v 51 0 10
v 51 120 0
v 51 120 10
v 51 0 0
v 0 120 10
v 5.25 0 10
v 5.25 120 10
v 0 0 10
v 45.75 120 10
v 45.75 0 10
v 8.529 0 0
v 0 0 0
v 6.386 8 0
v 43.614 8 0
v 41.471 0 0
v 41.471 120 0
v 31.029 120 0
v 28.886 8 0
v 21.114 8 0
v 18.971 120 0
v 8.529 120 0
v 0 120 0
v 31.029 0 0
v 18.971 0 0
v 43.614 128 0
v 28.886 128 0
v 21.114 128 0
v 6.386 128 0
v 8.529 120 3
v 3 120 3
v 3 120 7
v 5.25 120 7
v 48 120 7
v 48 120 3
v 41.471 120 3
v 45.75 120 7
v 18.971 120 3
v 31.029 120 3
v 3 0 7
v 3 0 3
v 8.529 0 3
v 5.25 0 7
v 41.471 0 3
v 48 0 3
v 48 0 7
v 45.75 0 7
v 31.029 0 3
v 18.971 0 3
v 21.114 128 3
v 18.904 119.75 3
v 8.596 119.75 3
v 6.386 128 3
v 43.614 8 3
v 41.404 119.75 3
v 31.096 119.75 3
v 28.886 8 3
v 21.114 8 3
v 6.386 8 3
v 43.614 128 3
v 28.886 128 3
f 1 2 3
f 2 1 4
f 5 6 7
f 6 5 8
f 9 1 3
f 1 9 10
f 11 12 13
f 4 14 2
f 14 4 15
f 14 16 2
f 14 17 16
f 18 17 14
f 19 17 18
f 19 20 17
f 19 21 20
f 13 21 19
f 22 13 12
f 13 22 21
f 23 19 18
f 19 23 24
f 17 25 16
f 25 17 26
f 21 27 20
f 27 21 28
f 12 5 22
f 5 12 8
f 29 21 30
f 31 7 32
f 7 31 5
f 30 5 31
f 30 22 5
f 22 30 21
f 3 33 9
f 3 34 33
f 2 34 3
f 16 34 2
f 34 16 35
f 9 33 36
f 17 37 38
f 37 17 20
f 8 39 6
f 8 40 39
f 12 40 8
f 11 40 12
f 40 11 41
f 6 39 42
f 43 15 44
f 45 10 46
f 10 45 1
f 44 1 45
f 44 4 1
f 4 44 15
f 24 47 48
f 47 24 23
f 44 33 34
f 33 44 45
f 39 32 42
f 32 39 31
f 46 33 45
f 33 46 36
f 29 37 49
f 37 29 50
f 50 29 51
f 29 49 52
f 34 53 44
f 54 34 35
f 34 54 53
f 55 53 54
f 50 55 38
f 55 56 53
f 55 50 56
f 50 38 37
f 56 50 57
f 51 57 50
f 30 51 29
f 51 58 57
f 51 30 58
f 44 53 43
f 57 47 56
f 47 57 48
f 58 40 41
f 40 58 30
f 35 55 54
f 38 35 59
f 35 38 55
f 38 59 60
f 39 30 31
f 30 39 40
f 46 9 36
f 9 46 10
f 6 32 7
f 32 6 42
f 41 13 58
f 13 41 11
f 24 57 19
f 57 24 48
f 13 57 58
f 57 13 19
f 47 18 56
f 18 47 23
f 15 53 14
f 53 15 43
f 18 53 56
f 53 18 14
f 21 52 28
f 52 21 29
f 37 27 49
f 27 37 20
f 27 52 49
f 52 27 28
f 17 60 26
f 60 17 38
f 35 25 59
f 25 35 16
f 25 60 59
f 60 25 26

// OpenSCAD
$fa = 1;
$fs = 0.1;

panel_height = 45;
panel_length = 120;
panel_depth = 4;

wall_thickness = 3;

module tray () {
    difference() {
        cube([
            panel_height + (wall_thickness * 2),
            panel_length,
            panel_depth + (wall_thickness * 2)
        ]);

        translate([wall_thickness, -0.001, wall_thickness])
            cube([
                panel_height,
                panel_length + 0.002,
                panel_depth
            ]);

        translate([wall_thickness * 1.75, -0.001, wall_thickness])
            cube([
                panel_height - (wall_thickness * 1.5),
                panel_length + 0.002,
                panel_depth + (wall_thickness * 2)
            ]);
    }
}

module _wedge () {
    rotate([0, 0, 15])
        cube([10, 10, wall_thickness], center=true);

    translate([-2.5, 0, 0])
        rotate([0, 0, -15])
        cube([10, 10, wall_thickness], center=true);
}

module wedge () {
    difference() {
        _wedge();

        translate([0, -6, 0])
            cube([20, 5, wall_thickness + 0.002], center=true);

        translate([0, 7.25, 0])
            cube([20, 5, wall_thickness + 0.002], center=true);
    }
}


difference() {
    tray();

    translate([12.5, 4.5, (wall_thickness / 2) - 0.001])
        rotate([0, 0, 180])
        scale([1, 1, 1.1])
        wedge();

    translate([35, 4.5, (wall_thickness / 2) - 0.001])
        rotate([0, 0, 180])
        scale([1, 1, 1.1])
        wedge();
}

translate([12.5, panel_length + 4.5, wall_thickness / 2])
    rotate([0, 0, 180])
    wedge();

translate([35, panel_length + 4.5, wall_thickness / 2])
    rotate([0, 0, 180])
    wedge();
